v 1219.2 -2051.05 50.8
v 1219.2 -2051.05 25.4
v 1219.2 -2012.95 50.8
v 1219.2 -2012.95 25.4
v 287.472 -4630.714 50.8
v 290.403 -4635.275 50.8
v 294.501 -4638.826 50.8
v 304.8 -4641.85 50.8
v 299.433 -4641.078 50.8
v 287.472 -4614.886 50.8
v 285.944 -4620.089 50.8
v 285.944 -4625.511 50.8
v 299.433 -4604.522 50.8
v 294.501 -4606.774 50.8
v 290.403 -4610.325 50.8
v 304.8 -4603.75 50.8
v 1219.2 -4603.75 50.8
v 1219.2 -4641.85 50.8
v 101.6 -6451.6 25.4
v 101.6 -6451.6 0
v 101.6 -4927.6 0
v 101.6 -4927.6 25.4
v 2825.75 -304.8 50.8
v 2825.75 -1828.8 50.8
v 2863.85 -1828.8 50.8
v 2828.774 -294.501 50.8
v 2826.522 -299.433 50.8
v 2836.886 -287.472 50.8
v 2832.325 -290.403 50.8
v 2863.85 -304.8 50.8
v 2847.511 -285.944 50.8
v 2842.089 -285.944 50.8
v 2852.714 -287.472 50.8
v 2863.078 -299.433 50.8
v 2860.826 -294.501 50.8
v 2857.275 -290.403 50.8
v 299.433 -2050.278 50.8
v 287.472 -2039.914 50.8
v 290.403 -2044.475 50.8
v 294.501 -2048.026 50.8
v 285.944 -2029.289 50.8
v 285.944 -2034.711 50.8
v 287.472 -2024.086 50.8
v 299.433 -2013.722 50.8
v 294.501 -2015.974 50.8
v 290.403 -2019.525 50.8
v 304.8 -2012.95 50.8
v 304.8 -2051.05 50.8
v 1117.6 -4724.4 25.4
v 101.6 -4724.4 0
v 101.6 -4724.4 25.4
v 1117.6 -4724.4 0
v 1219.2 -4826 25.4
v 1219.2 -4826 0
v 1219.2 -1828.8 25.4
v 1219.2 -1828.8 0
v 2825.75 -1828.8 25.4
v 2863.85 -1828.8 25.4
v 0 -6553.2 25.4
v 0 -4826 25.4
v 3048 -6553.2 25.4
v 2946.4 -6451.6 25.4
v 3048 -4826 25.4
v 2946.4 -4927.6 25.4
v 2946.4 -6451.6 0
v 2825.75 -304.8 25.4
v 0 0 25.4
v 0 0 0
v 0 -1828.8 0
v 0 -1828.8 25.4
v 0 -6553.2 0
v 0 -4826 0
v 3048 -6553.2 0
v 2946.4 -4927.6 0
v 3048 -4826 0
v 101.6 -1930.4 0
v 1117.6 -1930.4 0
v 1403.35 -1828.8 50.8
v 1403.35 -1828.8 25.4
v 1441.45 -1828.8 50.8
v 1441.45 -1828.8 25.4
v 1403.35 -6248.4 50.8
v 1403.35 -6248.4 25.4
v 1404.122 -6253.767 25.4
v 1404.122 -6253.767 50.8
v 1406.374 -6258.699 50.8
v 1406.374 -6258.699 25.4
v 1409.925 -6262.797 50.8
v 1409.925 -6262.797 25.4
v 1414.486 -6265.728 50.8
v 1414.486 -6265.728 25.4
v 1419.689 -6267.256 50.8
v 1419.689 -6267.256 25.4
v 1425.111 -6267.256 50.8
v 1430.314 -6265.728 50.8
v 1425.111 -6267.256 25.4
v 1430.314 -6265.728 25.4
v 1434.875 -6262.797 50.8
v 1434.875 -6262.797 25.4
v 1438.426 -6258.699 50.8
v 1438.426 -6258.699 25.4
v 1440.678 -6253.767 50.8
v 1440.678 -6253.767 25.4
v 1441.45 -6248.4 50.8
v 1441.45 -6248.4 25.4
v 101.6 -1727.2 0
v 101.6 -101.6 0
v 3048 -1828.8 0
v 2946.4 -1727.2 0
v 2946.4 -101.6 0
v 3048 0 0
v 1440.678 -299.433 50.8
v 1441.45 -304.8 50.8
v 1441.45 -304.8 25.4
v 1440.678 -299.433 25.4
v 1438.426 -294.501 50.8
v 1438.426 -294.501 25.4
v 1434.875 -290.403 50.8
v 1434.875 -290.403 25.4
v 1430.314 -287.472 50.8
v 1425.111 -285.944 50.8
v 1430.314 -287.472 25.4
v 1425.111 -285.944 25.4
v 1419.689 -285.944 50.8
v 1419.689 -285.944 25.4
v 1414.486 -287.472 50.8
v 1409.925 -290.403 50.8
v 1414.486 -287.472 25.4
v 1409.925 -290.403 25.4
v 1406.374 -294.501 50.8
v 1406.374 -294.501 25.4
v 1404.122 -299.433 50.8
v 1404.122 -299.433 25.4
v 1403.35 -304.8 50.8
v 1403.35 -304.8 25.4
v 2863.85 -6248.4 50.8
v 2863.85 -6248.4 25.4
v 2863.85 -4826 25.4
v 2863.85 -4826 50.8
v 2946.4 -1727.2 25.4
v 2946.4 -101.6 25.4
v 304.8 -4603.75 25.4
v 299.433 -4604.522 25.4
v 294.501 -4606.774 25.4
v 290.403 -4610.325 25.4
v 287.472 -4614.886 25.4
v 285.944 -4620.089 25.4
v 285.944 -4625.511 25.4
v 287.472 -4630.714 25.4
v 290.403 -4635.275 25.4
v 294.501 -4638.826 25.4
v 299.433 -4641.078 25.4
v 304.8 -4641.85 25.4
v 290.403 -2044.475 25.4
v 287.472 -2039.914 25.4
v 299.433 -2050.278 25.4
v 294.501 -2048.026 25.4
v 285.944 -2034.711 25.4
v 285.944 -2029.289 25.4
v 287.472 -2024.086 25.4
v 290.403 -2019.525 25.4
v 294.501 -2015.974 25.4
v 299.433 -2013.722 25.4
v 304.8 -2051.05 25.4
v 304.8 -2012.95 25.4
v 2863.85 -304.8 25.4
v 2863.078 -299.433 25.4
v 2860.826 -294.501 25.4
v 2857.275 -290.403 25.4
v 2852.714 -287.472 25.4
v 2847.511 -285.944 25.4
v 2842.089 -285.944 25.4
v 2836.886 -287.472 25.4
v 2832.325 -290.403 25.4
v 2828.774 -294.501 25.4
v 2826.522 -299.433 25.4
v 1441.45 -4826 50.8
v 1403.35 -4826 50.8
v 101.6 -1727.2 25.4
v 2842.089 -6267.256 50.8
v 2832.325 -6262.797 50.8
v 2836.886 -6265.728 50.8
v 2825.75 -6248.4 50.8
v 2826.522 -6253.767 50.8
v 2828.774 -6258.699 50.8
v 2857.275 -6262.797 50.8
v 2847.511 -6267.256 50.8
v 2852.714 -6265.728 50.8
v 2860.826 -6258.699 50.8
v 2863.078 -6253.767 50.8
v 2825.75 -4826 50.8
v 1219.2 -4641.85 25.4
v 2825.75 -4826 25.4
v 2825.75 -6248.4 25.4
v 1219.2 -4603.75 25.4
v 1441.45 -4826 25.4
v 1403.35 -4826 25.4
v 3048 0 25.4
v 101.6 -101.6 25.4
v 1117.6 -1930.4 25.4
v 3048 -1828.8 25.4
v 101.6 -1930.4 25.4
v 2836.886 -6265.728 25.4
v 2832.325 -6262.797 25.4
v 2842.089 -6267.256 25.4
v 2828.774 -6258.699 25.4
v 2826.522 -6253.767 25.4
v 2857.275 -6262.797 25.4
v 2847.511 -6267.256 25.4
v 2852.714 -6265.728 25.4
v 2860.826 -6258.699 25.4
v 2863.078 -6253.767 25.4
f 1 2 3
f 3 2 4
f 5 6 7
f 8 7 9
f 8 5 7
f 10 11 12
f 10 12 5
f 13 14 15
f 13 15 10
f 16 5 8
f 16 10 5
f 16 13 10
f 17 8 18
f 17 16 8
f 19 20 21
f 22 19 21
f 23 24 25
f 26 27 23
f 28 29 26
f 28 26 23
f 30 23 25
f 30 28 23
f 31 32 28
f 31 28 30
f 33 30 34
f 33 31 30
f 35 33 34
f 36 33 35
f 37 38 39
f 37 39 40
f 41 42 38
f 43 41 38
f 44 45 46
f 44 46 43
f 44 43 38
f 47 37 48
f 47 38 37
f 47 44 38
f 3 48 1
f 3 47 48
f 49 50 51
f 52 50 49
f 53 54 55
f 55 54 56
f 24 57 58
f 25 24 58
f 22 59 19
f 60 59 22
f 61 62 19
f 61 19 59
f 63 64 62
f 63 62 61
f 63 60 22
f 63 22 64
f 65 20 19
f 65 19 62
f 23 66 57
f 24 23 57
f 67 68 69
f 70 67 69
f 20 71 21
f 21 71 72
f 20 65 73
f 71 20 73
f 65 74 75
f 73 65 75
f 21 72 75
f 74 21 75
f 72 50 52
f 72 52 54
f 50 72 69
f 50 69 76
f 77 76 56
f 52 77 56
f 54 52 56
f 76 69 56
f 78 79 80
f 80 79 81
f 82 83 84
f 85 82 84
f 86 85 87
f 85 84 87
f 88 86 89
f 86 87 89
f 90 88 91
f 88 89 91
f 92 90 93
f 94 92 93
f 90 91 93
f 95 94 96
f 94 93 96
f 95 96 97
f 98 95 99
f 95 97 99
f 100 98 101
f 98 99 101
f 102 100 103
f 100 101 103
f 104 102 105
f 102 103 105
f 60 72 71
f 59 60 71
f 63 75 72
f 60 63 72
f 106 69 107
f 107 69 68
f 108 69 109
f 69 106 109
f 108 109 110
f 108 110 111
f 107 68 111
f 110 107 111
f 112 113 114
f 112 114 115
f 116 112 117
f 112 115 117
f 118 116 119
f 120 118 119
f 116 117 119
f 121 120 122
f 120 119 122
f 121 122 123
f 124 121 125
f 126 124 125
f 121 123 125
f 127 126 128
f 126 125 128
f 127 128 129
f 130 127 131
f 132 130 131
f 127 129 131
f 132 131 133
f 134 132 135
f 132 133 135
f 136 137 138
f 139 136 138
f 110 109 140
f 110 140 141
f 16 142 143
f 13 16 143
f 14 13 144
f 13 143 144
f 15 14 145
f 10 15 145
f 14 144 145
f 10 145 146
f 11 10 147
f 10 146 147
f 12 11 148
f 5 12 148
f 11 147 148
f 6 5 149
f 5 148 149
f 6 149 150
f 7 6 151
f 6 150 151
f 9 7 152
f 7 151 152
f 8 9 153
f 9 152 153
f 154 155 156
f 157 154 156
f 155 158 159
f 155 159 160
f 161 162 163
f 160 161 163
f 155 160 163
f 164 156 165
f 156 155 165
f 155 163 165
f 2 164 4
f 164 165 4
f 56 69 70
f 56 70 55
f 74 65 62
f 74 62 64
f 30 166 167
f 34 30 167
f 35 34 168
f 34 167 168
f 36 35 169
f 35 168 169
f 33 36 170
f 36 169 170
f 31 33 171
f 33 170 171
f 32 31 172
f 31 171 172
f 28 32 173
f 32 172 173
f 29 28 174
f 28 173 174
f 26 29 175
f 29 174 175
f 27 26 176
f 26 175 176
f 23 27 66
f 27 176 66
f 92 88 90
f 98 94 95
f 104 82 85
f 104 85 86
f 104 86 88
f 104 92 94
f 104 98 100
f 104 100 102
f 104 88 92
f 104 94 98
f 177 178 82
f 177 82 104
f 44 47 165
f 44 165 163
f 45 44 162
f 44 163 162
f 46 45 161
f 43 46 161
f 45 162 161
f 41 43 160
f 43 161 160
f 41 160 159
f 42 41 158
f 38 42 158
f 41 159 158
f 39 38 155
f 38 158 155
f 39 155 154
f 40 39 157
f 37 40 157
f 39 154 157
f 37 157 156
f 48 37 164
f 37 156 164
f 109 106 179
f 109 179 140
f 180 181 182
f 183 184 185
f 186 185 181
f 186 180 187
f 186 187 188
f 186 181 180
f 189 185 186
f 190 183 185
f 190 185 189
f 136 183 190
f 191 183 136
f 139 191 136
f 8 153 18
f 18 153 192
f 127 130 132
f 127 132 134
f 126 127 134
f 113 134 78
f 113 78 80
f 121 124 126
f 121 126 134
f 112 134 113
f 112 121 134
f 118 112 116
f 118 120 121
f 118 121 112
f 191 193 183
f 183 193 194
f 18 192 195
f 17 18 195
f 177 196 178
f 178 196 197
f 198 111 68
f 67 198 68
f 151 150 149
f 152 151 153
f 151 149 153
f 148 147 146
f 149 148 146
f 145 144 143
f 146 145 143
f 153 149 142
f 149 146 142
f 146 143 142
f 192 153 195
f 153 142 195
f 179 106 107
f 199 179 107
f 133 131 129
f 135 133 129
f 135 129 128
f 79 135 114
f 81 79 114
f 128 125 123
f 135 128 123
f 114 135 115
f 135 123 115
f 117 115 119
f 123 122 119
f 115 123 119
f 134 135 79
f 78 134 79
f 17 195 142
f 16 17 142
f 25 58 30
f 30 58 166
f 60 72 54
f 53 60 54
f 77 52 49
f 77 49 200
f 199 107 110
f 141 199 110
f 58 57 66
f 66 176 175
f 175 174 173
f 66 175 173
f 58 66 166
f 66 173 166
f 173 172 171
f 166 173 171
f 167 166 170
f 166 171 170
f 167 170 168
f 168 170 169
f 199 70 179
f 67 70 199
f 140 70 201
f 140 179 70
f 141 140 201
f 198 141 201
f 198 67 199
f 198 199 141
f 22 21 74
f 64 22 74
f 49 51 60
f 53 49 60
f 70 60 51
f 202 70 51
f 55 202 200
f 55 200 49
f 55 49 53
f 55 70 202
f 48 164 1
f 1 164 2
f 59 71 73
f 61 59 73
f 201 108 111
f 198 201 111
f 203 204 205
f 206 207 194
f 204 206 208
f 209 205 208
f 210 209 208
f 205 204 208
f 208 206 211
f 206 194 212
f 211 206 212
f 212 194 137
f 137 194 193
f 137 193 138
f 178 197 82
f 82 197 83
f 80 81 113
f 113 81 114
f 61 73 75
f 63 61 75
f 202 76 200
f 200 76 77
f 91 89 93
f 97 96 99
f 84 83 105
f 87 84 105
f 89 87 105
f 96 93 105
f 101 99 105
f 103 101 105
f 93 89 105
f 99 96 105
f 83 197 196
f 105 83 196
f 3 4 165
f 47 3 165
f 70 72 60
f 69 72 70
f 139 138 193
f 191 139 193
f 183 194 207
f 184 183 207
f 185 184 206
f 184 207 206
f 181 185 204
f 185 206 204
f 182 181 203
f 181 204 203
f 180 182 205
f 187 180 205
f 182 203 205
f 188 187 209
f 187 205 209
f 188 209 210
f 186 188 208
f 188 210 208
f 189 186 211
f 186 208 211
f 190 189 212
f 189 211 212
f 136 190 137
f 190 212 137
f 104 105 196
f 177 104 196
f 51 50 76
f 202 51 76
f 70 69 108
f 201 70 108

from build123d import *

# Parameters (mm, degrees)
F0_W     = 2844.8
F0_H     = 1625.6
F1_DEPTH = 25.4
F0_W_2   = 1219.2
F0_H_2   = 2997.2
F0_W_3   = 1016
F0_H_3   = 2794
F2_DEPTH = 25.4
F0_H_4   = 1524
F3_DEPTH = 25.4
F5_DEPTH = 25.4


with BuildPart() as f1:
    # F0 (on Top) → F1 (new body)
    with BuildSketch(Plane.XY):
        Polygon((3048, 0), (0, 0), (0, -1828.8), (1219.2, -1828.8), (3048, -1828.8), align=None)
        with Locations((1524, -914.4)):
            Rectangle(F0_W, F0_H, mode=Mode.SUBTRACT)
    extrude(amount=F1_DEPTH)


with BuildPart() as f2:
    # F0 (on Top) → F2 (new body)
    with BuildSketch(Plane.XY):
        with Locations((609.6, -3327.4)):
            Rectangle(F0_W_2, F0_H_2)
        with Locations((609.6, -3327.4)):
            Rectangle(F0_W_3, F0_H_3, mode=Mode.SUBTRACT)
    extrude(amount=F2_DEPTH)


with BuildPart() as f3:
    # F0 (on Top) → F3 (new body)
    with BuildSketch(Plane.XY):
        Polygon((1219.2, -4826), (0, -4826), (0, -6553.2), (3048, -6553.2), (3048, -4826), align=None)
        with Locations((1524, -5689.6)):
            Rectangle(F0_W, F0_H_4, mode=Mode.SUBTRACT)
    extrude(amount=F3_DEPTH)


with BuildPart() as f5:
    # F4 (on face) → F5 (new body)
    with BuildSketch(Plane.XY.offset(25.4)):
        with BuildLine():
            Line((2825.75, -304.8), (2825.75, -1828.8))
            Line((2825.75, -1828.8), (2863.85, -1828.8))
            Line((2863.85, -1828.8), (2863.85, -304.8))
            ThreePointArc((2863.85, -304.8), (2844.8, -323.85), (2825.75, -304.8))
        make_face()
        with BuildLine():
            ThreePointArc((2863.85, -304.8), (2844.8, -285.75), (2825.75, -304.8))
            Line((2825.75, -304.8), (2863.85, -304.8))
        make_face()
        with BuildLine():
            Line((2863.85, -304.8), (2825.75, -304.8))
            ThreePointArc((2825.75, -304.8), (2844.8, -323.85), (2863.85, -304.8))
        make_face()
    extrude(amount=F5_DEPTH)


with BuildPart() as f5b:
    # F4 (on face) → F5, piece 2 (new body)
    with BuildSketch(Plane.XY.offset(25.4)):
        with BuildLine():
            Line((1403.35, -304.8), (1403.35, -1828.8))
            Line((1403.35, -1828.8), (1441.45, -1828.8))
            Line((1441.45, -1828.8), (1441.45, -304.8))
            ThreePointArc((1441.45, -304.8), (1422.4, -323.85), (1403.35, -304.8))
        make_face()
        with BuildLine():
            ThreePointArc((1441.45, -304.8), (1422.4, -285.75), (1403.35, -304.8))
            Line((1403.35, -304.8), (1441.45, -304.8))
        make_face()
        with BuildLine():
            Line((1441.45, -304.8), (1403.35, -304.8))
            ThreePointArc((1403.35, -304.8), (1422.4, -323.85), (1441.45, -304.8))
        make_face()
    extrude(amount=F5_DEPTH)


with BuildPart() as f5c:
    # F4 (on face) → F5, piece 3 (new body)
    with BuildSketch(Plane.XY.offset(25.4)):
        with BuildLine():
            Line((1219.2, -2051.05), (1219.2, -2012.95))
            Line((1219.2, -2012.95), (304.8, -2012.95))
            ThreePointArc((304.8, -2012.95), (318.2703841816, -2018.5296158184), (323.85, -2032))
            ThreePointArc((323.85, -2032), (318.2703841816, -2045.4703841816), (304.8, -2051.05))
            Line((304.8, -2051.05), (1219.2, -2051.05))
        make_face()
        with BuildLine():
            ThreePointArc((323.85, -2032), (318.2703841816, -2018.5296158184), (304.8, -2012.95))
            Line((304.8, -2012.95), (304.8, -2051.05))
            ThreePointArc((304.8, -2051.05), (318.2703841816, -2045.4703841816), (323.85, -2032))
        make_face()
        with BuildLine():
            Line((304.8, -2051.05), (304.8, -2012.95))
            ThreePointArc((304.8, -2012.95), (285.75, -2032), (304.8, -2051.05))
        make_face()
    extrude(amount=F5_DEPTH)


with BuildPart() as f5d:
    # F4 (on face) → F5, piece 4 (new body)
    with BuildSketch(Plane.XY.offset(25.4)):
        with BuildLine():
            Line((1219.2, -4641.85), (1219.2, -4603.75))
            Line((1219.2, -4603.75), (304.8, -4603.75))
            ThreePointArc((304.8, -4603.75), (318.2703841816, -4609.3296158184), (323.85, -4622.8))
            ThreePointArc((323.85, -4622.8), (318.2703841816, -4636.2703841816), (304.8, -4641.85))
            Line((304.8, -4641.85), (1219.2, -4641.85))
        make_face()
        with BuildLine():
            ThreePointArc((323.85, -4622.8), (318.2703841816, -4609.3296158184), (304.8, -4603.75))
            Line((304.8, -4603.75), (304.8, -4641.85))
            ThreePointArc((304.8, -4641.85), (318.2703841816, -4636.2703841816), (323.85, -4622.8))
        make_face()
        with BuildLine():
            Line((304.8, -4641.85), (304.8, -4603.75))
            ThreePointArc((304.8, -4603.75), (285.75, -4622.8), (304.8, -4641.85))
        make_face()
    extrude(amount=F5_DEPTH)


with BuildPart() as f5e:
    # F4 (on face) → F5, piece 5 (new body)
    with BuildSketch(Plane.XY.offset(25.4)):
        with BuildLine():
            Line((1441.45, -4826), (1403.35, -4826))
            Line((1403.35, -4826), (1403.35, -6248.4))
            ThreePointArc((1403.35, -6248.4), (1422.4, -6229.35), (1441.45, -6248.4))
            Line((1441.45, -6248.4), (1441.45, -4826))
        make_face()
        with BuildLine():
            ThreePointArc((1441.45, -6248.4), (1422.4, -6229.35), (1403.35, -6248.4))
            Line((1403.35, -6248.4), (1441.45, -6248.4))
        make_face()
        with BuildLine():
            Line((1441.45, -6248.4), (1403.35, -6248.4))
            ThreePointArc((1403.35, -6248.4), (1422.4, -6267.45), (1441.45, -6248.4))
        make_face()
    extrude(amount=F5_DEPTH)


with BuildPart() as f5f:
    # F4 (on face) → F5, piece 6 (new body)
    with BuildSketch(Plane.XY.offset(25.4)):
        with BuildLine():
            Line((2863.85, -4826), (2825.75, -4826))
            Line((2825.75, -4826), (2825.75, -6248.4))
            ThreePointArc((2825.75, -6248.4), (2844.8, -6229.35), (2863.85, -6248.4))
            Line((2863.85, -6248.4), (2863.85, -4826))
        make_face()
        with BuildLine():
            ThreePointArc((2863.85, -6248.4), (2844.8, -6229.35), (2825.75, -6248.4))
            Line((2825.75, -6248.4), (2863.85, -6248.4))
        make_face()
        with BuildLine():
            Line((2863.85, -6248.4), (2825.75, -6248.4))
            ThreePointArc((2825.75, -6248.4), (2844.8, -6267.45), (2863.85, -6248.4))
        make_face()
    extrude(amount=F5_DEPTH)


solid = Compound([f1.part, f2.part, f3.part, f5.part, f5b.part, f5c.part, f5d.part, f5e.part, f5f.part])
